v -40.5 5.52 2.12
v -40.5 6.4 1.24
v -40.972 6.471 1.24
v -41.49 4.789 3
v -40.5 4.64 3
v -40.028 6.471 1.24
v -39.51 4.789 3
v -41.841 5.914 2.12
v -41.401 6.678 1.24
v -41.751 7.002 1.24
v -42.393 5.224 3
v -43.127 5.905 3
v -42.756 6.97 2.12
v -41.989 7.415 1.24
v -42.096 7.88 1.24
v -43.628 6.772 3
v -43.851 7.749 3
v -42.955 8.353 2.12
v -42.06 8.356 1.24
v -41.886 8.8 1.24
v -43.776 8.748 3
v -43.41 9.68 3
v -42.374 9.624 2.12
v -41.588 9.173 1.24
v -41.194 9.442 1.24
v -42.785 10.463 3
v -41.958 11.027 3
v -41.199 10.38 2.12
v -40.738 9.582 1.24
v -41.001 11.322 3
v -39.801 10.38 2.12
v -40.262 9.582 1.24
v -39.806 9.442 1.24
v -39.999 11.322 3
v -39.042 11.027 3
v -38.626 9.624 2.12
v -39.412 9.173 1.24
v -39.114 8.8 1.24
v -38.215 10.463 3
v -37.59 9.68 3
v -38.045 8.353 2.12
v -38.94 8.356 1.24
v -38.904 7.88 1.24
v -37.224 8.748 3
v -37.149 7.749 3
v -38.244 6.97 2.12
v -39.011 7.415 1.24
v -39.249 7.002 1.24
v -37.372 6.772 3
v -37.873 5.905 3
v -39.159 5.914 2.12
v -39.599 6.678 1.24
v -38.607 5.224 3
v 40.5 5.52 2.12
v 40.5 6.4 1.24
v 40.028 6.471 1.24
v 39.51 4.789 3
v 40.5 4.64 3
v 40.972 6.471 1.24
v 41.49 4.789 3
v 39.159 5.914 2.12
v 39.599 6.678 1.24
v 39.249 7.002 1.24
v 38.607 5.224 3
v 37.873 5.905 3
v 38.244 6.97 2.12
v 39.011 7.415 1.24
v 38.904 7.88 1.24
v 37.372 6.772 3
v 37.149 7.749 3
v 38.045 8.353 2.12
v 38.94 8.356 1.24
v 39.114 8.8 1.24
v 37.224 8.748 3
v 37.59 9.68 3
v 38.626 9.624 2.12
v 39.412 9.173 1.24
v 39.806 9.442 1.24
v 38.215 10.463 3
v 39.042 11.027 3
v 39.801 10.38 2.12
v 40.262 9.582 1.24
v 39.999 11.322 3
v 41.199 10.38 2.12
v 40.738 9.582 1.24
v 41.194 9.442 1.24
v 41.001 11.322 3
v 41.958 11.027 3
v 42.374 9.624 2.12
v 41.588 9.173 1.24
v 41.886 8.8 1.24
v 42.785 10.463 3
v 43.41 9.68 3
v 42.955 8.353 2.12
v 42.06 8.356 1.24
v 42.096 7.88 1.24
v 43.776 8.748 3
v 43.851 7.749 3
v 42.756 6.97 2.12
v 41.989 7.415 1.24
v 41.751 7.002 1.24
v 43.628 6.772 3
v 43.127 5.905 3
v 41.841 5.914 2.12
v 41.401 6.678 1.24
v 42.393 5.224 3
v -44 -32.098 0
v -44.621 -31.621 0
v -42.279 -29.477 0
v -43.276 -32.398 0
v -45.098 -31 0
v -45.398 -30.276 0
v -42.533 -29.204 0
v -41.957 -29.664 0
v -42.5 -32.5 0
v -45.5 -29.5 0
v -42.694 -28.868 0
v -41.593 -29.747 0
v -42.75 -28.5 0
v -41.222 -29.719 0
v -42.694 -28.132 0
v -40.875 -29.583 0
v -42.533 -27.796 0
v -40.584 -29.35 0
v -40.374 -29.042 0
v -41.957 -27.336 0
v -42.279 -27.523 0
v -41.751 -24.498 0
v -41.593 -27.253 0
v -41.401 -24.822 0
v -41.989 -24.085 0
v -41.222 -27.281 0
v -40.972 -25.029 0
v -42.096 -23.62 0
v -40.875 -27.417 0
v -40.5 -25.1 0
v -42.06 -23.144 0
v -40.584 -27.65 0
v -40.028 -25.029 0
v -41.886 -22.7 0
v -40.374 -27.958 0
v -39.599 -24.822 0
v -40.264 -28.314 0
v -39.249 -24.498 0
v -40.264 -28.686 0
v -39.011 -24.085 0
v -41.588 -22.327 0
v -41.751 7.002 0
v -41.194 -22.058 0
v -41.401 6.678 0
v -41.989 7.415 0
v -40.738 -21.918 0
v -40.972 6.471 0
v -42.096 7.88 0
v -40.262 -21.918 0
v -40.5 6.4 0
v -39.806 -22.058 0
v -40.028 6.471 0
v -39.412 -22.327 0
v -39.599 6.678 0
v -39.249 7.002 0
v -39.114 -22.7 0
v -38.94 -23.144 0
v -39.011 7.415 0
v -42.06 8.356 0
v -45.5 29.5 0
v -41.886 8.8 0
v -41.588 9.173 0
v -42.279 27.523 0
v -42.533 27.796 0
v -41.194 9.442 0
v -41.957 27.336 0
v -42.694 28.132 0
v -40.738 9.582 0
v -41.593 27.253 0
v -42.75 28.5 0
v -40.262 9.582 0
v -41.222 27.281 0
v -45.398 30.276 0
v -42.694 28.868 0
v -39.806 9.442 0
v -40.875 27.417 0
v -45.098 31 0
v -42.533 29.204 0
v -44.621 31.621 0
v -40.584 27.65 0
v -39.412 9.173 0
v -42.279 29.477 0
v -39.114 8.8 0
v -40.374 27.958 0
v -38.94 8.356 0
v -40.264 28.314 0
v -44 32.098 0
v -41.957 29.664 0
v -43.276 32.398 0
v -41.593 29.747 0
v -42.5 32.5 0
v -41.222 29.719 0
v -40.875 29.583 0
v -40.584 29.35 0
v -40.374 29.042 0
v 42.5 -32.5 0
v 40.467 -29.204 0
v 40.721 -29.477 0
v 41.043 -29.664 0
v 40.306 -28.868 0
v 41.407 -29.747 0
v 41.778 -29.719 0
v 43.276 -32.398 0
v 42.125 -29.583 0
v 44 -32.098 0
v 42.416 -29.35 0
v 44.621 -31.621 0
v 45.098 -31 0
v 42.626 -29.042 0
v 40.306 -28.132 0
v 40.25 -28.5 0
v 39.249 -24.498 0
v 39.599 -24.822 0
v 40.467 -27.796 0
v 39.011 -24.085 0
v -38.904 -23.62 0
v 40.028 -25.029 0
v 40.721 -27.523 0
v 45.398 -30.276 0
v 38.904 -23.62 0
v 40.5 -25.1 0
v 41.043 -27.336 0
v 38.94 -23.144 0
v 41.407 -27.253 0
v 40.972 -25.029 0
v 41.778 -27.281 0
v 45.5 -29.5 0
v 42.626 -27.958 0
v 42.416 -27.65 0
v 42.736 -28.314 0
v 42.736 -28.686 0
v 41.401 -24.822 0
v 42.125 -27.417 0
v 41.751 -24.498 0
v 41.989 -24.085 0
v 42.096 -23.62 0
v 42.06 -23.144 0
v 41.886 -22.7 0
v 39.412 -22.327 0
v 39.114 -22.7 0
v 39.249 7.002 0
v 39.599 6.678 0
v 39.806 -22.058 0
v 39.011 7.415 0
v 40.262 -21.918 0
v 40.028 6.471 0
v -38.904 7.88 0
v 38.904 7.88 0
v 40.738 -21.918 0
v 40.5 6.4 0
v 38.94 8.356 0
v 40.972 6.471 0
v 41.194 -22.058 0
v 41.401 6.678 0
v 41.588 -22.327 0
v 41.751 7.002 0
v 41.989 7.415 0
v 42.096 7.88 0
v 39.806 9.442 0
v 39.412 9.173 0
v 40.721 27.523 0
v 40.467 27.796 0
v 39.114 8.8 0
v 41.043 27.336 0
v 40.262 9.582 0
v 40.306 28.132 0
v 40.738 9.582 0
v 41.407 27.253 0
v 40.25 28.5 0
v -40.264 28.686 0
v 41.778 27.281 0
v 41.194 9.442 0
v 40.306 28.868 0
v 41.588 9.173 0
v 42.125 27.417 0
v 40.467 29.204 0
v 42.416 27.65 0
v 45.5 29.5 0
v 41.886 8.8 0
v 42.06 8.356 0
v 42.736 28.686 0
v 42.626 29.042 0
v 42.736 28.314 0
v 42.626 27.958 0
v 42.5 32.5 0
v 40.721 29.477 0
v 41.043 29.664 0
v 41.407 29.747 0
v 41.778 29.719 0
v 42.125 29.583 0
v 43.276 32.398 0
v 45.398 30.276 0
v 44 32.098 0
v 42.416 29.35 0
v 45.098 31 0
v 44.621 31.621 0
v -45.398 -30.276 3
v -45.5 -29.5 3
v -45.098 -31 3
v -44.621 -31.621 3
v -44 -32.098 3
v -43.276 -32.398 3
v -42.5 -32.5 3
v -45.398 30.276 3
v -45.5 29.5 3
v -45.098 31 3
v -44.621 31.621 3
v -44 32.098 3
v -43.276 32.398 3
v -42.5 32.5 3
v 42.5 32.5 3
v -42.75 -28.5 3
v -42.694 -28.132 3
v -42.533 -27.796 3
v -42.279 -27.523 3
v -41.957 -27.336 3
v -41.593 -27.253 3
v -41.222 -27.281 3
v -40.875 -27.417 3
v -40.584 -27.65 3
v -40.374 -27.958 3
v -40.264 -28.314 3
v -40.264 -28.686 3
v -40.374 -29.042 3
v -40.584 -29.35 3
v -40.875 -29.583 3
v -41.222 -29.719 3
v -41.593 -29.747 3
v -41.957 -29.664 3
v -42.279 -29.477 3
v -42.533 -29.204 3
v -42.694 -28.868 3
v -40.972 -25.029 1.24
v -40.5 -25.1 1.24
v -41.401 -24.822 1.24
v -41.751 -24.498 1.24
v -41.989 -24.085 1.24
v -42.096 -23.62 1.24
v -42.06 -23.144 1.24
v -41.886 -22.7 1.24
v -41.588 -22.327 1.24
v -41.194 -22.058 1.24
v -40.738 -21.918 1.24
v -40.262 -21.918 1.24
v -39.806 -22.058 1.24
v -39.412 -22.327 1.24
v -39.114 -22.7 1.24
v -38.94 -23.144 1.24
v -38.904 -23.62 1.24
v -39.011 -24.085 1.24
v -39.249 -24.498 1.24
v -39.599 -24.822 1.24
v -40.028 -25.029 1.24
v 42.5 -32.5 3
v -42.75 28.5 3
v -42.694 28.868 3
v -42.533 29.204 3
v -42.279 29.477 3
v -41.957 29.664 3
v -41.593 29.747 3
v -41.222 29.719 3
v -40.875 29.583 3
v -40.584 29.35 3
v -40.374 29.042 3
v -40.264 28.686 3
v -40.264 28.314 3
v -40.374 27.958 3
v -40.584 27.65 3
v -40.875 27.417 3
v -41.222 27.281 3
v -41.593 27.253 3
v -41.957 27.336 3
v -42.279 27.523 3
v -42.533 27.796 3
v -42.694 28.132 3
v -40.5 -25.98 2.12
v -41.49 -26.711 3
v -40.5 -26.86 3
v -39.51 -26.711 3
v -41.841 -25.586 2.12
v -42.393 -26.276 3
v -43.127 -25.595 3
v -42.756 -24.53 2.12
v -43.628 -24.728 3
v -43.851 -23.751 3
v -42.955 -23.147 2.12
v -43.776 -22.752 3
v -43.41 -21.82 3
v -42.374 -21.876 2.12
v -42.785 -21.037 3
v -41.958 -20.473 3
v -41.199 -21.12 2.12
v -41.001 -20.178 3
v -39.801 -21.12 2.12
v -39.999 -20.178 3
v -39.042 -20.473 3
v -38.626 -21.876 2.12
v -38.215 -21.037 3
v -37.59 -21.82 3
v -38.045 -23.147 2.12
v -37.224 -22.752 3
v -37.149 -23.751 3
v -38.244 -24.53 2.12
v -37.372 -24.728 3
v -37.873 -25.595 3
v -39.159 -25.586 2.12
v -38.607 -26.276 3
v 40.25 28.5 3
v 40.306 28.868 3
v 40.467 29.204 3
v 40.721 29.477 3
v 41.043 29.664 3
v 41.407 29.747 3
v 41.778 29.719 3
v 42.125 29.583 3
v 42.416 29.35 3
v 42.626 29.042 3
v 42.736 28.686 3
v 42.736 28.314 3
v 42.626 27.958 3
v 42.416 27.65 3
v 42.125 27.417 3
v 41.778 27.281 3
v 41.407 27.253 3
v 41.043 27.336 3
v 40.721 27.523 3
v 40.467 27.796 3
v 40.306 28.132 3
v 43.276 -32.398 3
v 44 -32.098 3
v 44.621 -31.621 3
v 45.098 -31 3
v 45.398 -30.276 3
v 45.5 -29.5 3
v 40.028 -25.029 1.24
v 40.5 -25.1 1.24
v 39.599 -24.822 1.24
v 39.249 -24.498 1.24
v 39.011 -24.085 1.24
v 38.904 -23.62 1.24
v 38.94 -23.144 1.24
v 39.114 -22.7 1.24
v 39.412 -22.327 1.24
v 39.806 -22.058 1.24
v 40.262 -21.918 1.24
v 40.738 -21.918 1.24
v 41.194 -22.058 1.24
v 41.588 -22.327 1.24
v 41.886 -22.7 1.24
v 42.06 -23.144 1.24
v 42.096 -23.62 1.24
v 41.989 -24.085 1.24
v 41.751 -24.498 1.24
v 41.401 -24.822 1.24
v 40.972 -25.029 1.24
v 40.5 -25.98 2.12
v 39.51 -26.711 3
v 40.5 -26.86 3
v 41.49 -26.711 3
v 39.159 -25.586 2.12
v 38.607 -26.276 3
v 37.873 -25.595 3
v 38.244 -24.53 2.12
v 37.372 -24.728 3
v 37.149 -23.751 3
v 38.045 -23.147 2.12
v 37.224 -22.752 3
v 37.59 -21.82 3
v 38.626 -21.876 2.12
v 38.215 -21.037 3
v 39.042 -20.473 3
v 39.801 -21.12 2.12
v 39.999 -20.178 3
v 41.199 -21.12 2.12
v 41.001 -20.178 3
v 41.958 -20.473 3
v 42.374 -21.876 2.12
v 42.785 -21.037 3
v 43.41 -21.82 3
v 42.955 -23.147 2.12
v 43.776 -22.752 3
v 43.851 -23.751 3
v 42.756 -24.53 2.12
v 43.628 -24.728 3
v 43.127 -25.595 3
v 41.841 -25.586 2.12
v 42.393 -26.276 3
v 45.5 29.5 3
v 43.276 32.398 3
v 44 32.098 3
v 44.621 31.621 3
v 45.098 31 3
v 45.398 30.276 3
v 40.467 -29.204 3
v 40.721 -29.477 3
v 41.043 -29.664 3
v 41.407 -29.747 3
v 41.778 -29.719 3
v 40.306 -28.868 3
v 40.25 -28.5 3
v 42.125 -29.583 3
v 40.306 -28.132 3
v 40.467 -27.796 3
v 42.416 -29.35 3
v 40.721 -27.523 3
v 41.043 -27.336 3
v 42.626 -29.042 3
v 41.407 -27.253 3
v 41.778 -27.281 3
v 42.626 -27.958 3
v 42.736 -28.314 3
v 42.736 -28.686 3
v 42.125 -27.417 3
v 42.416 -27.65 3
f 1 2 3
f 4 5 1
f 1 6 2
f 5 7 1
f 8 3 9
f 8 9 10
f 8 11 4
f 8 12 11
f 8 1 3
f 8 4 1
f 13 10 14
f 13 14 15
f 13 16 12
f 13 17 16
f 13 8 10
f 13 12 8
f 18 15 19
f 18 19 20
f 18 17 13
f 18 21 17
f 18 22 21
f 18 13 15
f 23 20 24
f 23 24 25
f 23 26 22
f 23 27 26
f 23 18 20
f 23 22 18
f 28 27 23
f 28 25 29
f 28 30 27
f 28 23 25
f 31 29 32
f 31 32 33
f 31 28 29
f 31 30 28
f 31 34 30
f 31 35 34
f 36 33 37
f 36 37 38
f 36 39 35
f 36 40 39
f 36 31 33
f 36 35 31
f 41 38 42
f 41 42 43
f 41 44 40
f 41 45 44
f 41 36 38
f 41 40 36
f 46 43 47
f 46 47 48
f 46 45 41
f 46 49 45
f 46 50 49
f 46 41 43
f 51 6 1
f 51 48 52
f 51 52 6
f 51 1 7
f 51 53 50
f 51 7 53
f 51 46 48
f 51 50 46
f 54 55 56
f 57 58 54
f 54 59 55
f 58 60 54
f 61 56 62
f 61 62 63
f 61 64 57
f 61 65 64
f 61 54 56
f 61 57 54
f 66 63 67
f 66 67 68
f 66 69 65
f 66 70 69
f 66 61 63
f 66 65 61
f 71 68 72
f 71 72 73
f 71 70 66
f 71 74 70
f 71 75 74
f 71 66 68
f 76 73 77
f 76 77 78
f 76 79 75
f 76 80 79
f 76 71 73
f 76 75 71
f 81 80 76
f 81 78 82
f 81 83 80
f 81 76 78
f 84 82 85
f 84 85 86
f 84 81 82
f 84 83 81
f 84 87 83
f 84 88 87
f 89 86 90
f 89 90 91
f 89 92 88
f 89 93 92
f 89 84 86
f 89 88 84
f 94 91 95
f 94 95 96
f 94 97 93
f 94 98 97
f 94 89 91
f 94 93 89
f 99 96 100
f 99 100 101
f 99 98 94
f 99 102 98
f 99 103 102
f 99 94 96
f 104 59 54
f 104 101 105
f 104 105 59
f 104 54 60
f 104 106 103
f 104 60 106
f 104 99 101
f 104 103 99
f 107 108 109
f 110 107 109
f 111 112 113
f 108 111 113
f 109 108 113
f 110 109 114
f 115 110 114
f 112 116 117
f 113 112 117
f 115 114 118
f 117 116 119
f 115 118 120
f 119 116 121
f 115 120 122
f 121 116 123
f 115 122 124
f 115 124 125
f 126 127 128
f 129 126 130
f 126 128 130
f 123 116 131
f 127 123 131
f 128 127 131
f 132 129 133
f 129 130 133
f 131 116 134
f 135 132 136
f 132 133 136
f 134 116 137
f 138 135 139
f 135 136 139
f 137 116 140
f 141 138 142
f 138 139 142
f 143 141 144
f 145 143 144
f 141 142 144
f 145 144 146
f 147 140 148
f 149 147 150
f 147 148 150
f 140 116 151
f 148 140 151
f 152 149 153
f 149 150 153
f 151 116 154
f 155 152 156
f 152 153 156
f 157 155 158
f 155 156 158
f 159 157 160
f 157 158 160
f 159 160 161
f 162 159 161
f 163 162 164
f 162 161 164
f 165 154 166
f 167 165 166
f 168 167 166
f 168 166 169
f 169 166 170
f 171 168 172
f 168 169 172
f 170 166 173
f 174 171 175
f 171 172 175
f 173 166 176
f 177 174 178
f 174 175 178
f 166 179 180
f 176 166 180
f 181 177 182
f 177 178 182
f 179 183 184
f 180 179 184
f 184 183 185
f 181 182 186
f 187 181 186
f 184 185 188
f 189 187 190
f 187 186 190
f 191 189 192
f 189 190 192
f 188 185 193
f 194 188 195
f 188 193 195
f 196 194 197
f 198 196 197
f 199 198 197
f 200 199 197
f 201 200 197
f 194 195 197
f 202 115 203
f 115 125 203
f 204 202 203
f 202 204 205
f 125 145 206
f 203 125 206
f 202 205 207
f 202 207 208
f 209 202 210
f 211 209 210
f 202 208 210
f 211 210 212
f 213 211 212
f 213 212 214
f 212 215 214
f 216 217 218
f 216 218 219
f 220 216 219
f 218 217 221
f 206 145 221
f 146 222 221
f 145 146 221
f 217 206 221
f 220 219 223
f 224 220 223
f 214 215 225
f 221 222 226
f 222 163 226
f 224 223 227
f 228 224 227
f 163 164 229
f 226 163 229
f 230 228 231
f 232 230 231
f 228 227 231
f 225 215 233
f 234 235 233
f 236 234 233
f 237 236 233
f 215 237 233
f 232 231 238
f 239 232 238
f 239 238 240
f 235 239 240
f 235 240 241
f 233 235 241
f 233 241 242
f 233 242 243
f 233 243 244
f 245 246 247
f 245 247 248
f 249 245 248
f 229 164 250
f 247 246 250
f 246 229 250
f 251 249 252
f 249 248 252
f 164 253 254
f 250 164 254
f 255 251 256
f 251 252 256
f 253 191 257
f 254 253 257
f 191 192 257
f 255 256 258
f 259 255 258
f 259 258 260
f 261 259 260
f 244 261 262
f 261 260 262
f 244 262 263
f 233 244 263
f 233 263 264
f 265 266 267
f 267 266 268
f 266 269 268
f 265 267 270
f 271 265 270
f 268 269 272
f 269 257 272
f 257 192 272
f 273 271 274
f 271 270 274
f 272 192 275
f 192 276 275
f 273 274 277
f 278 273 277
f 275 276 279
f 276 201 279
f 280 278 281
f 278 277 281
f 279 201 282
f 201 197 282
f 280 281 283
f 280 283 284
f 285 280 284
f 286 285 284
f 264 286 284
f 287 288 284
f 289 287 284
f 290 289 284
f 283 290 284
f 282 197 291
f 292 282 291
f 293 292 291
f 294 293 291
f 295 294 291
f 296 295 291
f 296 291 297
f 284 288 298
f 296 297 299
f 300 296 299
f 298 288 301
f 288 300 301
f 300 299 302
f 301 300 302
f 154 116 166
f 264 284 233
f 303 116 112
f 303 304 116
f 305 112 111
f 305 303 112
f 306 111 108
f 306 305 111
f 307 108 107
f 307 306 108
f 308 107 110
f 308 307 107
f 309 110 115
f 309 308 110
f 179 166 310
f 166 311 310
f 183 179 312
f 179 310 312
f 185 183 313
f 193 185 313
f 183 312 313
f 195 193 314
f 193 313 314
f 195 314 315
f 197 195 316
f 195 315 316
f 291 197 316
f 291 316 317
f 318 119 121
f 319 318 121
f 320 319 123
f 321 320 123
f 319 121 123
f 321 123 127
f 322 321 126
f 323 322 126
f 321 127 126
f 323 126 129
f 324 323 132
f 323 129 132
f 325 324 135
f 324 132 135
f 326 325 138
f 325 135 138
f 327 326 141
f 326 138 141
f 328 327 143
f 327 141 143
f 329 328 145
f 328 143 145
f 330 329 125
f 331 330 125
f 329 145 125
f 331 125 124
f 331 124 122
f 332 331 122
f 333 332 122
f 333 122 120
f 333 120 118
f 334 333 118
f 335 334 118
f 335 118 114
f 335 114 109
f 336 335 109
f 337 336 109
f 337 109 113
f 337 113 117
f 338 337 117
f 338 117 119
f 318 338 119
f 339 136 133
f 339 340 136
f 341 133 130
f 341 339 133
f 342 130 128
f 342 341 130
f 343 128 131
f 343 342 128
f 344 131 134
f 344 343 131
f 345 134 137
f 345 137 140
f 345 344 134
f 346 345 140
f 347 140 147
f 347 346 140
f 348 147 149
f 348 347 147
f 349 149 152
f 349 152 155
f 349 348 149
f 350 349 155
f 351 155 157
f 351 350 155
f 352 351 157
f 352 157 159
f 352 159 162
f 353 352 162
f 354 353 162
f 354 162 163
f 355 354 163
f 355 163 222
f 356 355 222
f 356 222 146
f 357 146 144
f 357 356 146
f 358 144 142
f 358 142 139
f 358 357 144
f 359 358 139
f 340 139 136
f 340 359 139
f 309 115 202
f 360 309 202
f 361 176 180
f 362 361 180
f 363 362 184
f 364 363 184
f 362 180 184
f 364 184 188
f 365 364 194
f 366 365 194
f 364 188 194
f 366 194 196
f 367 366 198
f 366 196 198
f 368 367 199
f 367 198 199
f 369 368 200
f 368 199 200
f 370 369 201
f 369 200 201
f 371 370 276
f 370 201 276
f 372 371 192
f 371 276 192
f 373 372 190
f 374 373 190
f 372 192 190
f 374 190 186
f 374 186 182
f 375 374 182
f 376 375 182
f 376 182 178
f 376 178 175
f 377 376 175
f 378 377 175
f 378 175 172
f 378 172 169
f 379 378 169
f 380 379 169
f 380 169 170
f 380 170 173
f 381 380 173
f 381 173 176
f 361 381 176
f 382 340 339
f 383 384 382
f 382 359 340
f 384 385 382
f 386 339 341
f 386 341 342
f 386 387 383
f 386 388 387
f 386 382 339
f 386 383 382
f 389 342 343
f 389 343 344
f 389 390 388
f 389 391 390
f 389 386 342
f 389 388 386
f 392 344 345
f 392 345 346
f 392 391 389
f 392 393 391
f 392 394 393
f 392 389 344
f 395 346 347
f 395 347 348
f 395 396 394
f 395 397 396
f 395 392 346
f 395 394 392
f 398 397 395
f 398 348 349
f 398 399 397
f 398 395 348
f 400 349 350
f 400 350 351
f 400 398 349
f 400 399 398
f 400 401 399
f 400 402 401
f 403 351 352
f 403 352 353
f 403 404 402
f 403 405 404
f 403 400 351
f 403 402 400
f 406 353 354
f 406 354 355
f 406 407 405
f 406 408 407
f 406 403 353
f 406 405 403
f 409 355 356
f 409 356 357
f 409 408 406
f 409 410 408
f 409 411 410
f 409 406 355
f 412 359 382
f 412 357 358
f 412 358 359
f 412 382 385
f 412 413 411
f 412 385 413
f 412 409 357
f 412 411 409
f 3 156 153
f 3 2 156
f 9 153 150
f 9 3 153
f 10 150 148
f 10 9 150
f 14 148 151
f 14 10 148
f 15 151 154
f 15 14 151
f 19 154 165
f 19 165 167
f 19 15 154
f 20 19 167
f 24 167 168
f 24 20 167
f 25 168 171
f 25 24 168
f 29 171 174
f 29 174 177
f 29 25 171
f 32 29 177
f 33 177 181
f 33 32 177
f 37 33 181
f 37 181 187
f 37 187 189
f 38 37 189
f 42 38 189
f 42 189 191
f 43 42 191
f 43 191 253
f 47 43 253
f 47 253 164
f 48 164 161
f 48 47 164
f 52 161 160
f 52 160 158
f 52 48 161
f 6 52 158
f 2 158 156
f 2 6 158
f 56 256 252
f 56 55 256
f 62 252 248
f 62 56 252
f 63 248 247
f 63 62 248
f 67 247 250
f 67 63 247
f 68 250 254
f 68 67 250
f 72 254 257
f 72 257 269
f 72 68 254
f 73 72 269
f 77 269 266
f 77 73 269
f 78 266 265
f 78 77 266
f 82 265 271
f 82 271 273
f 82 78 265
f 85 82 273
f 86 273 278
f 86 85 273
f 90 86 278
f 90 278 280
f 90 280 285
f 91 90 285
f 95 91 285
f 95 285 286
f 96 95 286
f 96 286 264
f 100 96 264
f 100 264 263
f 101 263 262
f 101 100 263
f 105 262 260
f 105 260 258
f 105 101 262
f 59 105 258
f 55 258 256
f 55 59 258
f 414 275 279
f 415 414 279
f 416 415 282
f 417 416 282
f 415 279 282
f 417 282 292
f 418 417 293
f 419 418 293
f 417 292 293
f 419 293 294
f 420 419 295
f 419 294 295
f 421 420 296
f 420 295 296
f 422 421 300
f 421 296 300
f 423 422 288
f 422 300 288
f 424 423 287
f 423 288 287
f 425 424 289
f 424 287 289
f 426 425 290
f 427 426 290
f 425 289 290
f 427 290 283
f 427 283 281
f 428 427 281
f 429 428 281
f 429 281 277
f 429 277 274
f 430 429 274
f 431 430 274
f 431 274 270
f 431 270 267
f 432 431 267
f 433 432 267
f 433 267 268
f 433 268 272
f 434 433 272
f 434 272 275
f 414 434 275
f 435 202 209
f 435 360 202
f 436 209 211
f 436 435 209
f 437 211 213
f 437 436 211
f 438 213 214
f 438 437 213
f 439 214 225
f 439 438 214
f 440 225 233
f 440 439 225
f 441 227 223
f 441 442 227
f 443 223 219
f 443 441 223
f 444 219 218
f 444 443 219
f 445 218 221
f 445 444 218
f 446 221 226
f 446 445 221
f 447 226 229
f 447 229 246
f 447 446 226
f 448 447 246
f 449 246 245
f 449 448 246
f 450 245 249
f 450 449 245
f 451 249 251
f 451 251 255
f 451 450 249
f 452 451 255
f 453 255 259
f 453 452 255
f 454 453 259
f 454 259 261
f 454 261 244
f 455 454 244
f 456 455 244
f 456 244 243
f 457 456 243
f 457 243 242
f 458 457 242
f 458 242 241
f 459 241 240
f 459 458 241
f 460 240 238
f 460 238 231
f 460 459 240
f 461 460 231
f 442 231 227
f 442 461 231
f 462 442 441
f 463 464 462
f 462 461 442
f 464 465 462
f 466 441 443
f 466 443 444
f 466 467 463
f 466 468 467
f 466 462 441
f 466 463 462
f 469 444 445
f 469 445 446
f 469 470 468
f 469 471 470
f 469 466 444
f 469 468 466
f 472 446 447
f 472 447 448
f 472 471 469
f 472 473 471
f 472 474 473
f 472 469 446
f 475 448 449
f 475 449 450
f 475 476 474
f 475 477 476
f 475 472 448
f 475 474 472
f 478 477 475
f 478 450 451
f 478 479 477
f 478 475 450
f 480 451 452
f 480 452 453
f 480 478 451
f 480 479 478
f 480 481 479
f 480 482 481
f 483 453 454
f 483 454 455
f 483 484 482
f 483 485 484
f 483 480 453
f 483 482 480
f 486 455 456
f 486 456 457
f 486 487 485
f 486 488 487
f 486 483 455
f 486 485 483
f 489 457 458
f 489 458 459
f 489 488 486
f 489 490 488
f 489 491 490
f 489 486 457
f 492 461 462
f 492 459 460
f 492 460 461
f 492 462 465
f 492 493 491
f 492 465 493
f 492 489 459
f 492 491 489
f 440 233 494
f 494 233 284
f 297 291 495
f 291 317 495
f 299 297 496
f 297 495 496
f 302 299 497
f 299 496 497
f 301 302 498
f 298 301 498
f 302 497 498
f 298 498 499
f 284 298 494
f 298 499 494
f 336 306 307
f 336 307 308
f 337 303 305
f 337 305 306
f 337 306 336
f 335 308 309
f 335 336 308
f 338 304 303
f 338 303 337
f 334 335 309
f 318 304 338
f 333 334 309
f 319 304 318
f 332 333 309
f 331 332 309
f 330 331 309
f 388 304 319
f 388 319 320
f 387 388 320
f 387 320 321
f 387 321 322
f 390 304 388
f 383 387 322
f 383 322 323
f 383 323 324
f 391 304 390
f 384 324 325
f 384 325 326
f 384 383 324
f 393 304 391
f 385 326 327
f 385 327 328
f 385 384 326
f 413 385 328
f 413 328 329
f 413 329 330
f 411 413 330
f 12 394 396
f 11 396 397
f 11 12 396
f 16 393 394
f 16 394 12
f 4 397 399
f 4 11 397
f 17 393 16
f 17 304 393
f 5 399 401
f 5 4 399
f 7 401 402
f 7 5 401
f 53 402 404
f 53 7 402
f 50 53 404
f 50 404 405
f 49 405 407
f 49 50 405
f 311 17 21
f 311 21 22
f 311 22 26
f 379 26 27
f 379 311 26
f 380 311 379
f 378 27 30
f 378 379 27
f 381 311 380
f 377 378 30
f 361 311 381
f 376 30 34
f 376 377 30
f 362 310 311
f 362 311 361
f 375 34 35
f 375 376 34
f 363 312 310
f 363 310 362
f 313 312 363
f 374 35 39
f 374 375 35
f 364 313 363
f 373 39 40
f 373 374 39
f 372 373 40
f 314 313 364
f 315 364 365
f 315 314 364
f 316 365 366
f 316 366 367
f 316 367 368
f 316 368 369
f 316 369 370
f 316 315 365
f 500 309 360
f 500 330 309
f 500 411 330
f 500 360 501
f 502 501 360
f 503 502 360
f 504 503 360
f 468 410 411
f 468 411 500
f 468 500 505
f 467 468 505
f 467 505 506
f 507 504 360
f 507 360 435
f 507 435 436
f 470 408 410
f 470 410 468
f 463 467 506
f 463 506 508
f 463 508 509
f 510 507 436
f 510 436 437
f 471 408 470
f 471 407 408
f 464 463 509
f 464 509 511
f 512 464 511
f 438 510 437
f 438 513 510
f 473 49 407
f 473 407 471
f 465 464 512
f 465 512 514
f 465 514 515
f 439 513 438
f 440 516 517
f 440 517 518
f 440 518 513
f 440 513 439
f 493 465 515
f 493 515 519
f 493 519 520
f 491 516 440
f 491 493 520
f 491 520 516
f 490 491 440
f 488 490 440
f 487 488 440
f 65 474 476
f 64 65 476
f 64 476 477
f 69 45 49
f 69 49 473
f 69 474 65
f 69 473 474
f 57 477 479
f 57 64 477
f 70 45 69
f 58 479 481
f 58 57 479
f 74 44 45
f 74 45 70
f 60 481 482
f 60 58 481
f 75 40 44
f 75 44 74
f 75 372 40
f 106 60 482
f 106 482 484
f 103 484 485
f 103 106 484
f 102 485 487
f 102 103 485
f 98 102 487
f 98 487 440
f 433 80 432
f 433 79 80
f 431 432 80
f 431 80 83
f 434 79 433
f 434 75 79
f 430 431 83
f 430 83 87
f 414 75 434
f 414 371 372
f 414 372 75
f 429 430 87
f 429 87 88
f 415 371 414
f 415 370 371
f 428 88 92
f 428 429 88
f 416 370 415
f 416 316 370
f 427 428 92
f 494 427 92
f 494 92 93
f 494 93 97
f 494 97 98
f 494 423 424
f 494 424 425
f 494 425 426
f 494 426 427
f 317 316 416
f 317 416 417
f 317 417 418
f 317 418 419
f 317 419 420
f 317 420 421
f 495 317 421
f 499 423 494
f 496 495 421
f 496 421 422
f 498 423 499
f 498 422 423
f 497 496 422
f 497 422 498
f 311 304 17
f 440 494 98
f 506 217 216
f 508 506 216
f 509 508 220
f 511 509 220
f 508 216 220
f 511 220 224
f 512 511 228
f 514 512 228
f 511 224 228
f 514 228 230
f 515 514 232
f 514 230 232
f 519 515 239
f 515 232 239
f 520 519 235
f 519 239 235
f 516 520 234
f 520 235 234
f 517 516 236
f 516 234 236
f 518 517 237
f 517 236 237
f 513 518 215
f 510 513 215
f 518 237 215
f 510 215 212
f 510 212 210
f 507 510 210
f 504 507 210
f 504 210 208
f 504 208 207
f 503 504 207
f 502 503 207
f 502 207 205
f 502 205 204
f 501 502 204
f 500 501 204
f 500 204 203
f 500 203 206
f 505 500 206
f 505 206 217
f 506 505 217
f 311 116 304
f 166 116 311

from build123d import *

# Parameters (mm, degrees)
SKETCH1_W                    = 91
SKETCH1_H                    = 65
BOSS_EXTRUDE1_DEPTH          = 3
TAP_DRILL_FOR_M3X0_5_TAP1_D  = 2.5
FILLET1_R                    = 3
CSK_FOR_M3_SFHCS1_AT_2_COUNT = 2
CSK_FOR_M3_SFHCS1_AT_2_PITCH = 31.5
CSK_FOR_M3_SFHCS1_AT_3_COUNT = 2
CSK_FOR_M3_SFHCS1_AT_3_PITCH = 86.909435621
CSK_FOR_M3_SFHCS1_AT_4_COUNT = 2
CSK_FOR_M3_SFHCS1_AT_4_PITCH = 81


with BuildPart() as part:
    # Sketch1 → Boss-Extrude1 (new body)
    with BuildSketch(Plane.XY):
        Rectangle(SKETCH1_W, SKETCH1_H)
    extrude(amount=BOSS_EXTRUDE1_DEPTH)

    # Tap Drill for M3x0.5 Tap1 (through all)
    with Locations(Plane.XY.offset(3)):
        with Locations((-41.5, 28.5), (41.5, 28.5), (41.5, -28.5), (-41.5, -28.5)):
            Hole(TAP_DRILL_FOR_M3X0_5_TAP1_D / 2)

    # Fillet1
    fillet1_edges = [part.edges().sort_by_distance(p)[0] for p in [
        (-45.5, 32.5, 1.5),
        (45.5, 32.5, 1.5),
        (45.5, -32.5, 1.5),
        (-45.5, -32.5, 1.5),
    ]]
    fillet(fillet1_edges, radius=FILLET1_R)

    # Sketch7 → CSK for M3 SFHCS1 (revolve, cut)
    with BuildSketch(Plane(origin=(-40.5, 8, 3), x_dir=(0, -1, 0), z_dir=(1, 0, 0))):
        Polygon((0, 0), (0, 3), (1.6, 3), (1.6, 1.76), (3.36, 0), align=None)
    csk_for_m3_sfhcs1 = revolve(axis=Axis((-40.5, 8, 9.35), (0, 0, -1)), mode=Mode.SUBTRACT)

    # CSK for M3 SFHCS1 at 2: CSK for M3 SFHCS1 ×2
    with Locations(*[(0, -i * CSK_FOR_M3_SFHCS1_AT_2_PITCH, 0) for i in range(1, CSK_FOR_M3_SFHCS1_AT_2_COUNT)]):
        add(csk_for_m3_sfhcs1, mode=Mode.SUBTRACT)

    # CSK for M3 SFHCS1 at 3: CSK for M3 SFHCS1 ×2
    with Locations(*[Vector(0.932004671541296, -0.36244626115494855, 0) * (i * CSK_FOR_M3_SFHCS1_AT_3_PITCH) for i in range(1, CSK_FOR_M3_SFHCS1_AT_3_COUNT)]):
        add(csk_for_m3_sfhcs1, mode=Mode.SUBTRACT)

    # CSK for M3 SFHCS1 at 4: CSK for M3 SFHCS1 ×2
    with Locations(*[(i * CSK_FOR_M3_SFHCS1_AT_4_PITCH, 0, 0) for i in range(1, CSK_FOR_M3_SFHCS1_AT_4_COUNT)]):
        add(csk_for_m3_sfhcs1, mode=Mode.SUBTRACT)


solid = part.part
